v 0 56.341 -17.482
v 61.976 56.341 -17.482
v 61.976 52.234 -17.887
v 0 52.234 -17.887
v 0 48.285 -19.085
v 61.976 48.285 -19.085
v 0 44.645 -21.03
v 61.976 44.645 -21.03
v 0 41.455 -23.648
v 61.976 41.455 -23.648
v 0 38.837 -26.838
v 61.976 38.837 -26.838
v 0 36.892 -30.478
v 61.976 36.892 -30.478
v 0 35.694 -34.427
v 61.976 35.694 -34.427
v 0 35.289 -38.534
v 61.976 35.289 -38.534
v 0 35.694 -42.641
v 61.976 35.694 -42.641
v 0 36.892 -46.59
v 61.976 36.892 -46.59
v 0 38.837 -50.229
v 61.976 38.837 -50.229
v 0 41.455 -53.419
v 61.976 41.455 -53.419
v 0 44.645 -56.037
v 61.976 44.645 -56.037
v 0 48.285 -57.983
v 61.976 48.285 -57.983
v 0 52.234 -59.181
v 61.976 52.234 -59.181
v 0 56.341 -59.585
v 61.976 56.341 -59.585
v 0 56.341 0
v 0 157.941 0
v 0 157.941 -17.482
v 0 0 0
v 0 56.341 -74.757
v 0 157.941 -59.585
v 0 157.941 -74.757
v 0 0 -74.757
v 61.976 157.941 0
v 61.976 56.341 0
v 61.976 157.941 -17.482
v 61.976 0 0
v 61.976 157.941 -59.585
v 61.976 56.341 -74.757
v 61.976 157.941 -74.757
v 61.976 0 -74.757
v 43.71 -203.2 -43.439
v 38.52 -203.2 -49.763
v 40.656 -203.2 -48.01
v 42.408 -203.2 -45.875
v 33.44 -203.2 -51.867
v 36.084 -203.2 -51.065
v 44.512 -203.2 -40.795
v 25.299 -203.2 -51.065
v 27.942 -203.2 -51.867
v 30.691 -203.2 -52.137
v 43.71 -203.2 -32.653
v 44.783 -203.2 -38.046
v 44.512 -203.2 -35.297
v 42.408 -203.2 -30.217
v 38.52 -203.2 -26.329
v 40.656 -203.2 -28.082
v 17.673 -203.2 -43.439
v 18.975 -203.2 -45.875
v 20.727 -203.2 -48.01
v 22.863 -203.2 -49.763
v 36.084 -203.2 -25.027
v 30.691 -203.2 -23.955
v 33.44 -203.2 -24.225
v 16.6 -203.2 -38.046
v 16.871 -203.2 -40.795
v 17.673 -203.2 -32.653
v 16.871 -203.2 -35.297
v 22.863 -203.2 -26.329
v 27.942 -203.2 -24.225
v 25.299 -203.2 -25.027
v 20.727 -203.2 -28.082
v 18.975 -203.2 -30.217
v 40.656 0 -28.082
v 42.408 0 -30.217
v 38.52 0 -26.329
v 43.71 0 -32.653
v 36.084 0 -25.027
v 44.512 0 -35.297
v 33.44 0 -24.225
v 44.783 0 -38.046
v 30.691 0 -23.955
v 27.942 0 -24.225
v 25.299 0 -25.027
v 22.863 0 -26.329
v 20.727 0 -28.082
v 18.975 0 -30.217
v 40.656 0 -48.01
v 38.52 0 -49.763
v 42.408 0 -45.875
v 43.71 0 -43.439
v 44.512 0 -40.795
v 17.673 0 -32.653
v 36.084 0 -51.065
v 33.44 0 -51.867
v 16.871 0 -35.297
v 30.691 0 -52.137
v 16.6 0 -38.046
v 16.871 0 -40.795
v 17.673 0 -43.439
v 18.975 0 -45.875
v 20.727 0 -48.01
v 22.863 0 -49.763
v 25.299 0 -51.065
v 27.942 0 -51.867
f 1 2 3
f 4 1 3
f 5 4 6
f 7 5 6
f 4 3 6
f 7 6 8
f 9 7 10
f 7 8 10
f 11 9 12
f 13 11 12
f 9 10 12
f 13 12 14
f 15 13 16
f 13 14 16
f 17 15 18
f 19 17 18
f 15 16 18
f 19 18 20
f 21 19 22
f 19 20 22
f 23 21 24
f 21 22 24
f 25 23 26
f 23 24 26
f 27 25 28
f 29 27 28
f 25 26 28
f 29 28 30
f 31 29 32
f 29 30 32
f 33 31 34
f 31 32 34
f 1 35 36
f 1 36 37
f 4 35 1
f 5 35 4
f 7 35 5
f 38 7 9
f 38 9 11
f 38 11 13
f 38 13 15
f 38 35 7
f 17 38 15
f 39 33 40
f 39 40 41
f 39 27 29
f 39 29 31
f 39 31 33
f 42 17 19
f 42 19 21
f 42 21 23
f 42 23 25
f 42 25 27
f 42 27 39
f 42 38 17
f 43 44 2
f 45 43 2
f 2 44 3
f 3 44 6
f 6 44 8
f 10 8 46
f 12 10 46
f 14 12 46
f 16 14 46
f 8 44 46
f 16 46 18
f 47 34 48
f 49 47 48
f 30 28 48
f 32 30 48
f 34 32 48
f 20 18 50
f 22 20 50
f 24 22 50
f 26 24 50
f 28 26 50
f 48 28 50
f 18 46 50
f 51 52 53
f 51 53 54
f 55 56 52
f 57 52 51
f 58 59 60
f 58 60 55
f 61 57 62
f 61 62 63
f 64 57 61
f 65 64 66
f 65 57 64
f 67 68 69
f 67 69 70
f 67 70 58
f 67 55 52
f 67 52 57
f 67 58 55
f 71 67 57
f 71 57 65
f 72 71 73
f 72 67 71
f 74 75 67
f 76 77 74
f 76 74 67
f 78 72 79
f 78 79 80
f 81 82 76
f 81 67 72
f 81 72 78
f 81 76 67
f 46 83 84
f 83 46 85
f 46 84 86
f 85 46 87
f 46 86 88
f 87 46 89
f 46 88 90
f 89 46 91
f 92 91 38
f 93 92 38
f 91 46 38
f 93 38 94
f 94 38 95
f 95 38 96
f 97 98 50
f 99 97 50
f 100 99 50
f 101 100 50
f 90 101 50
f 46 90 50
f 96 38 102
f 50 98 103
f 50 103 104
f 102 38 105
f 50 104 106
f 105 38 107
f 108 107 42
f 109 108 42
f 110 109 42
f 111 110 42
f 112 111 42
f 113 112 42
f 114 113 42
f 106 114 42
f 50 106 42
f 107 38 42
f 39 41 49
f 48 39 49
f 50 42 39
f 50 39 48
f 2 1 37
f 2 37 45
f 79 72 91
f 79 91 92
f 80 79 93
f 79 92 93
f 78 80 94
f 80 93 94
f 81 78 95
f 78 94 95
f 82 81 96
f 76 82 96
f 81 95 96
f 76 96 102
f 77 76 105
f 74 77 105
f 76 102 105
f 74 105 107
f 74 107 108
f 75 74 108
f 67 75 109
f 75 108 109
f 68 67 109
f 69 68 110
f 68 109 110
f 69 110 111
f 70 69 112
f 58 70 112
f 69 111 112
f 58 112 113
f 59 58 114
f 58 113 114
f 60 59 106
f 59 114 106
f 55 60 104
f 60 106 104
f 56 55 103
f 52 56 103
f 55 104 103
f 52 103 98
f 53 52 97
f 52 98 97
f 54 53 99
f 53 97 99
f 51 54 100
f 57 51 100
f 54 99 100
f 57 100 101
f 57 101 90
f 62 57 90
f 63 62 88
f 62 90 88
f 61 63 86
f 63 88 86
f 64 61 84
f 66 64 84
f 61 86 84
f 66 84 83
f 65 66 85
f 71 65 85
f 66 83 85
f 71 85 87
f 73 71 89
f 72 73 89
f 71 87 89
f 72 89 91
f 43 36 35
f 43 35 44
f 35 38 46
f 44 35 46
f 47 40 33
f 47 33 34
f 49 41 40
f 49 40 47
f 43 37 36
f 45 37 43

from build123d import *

# Parameters (mm, degrees)
SKETCH1_W           = 74.757250499
SKETCH1_H           = 56.340774555
BOSS_EXTRUDE1_DEPTH = 61.976
SKETCH2_R           = 21.051545166
CUT_EXTRUDE1_DEPTH  = 61.976
SKETCH3_W           = 61.976
SKETCH3_H           = 17.482215828
BOSS_EXTRUDE2_DEPTH = 101.6
SKETCH4_R           = 14.091408647
BOSS_EXTRUDE3_DEPTH = 203.2
SKETCH5_W           = 61.976
SKETCH5_H           = 15.17194434
BOSS_EXTRUDE4_DEPTH = 101.6


with BuildPart() as part:
    # Sketch1 → Boss-Extrude1 (new body)
    with BuildSketch(Plane(origin=(0, 0, 0), x_dir=(0, 0, -1), z_dir=(1, 0, 0))):
        with Locations((37.37862525, 28.170387278)):
            Rectangle(SKETCH1_W, SKETCH1_H)
    extrude(amount=BOSS_EXTRUDE1_DEPTH)

    # Sketch2 → Cut-Extrude1 (cut)
    with BuildSketch(Plane(origin=(61.976, 0, 0), x_dir=(0, 0, -1), z_dir=(1, 0, 0))):
        with Locations((38.533760994, 56.340774555)):
            Circle(SKETCH2_R)
    extrude(amount=-CUT_EXTRUDE1_DEPTH, mode=Mode.SUBTRACT)

    # Sketch3 → Boss-Extrude2 (add)
    with BuildSketch(Plane(origin=(0, 56.340774555, 0), x_dir=(1, 0, 0), z_dir=(0, 1, 0))):
        with Locations((30.988, 8.741107914)):
            Rectangle(SKETCH3_W, SKETCH3_H)
    extrude(amount=BOSS_EXTRUDE2_DEPTH)

    # Sketch4 → Boss-Extrude3 (add)
    with BuildSketch(Plane.XZ):
        with Locations(Location((30.69138806, -38.046002115, 0), (0, 0, 90))):
            Circle(SKETCH4_R)
    extrude(amount=BOSS_EXTRUDE3_DEPTH)

    # Sketch5 → Boss-Extrude4 (add)
    with BuildSketch(Plane(origin=(0, 56.340774555, 0), x_dir=(1, 0, 0), z_dir=(0, 1, 0))):
        with Locations((30.988, 67.171278329)):
            Rectangle(SKETCH5_W, SKETCH5_H)
    extrude(amount=BOSS_EXTRUDE4_DEPTH)


solid = part.part
